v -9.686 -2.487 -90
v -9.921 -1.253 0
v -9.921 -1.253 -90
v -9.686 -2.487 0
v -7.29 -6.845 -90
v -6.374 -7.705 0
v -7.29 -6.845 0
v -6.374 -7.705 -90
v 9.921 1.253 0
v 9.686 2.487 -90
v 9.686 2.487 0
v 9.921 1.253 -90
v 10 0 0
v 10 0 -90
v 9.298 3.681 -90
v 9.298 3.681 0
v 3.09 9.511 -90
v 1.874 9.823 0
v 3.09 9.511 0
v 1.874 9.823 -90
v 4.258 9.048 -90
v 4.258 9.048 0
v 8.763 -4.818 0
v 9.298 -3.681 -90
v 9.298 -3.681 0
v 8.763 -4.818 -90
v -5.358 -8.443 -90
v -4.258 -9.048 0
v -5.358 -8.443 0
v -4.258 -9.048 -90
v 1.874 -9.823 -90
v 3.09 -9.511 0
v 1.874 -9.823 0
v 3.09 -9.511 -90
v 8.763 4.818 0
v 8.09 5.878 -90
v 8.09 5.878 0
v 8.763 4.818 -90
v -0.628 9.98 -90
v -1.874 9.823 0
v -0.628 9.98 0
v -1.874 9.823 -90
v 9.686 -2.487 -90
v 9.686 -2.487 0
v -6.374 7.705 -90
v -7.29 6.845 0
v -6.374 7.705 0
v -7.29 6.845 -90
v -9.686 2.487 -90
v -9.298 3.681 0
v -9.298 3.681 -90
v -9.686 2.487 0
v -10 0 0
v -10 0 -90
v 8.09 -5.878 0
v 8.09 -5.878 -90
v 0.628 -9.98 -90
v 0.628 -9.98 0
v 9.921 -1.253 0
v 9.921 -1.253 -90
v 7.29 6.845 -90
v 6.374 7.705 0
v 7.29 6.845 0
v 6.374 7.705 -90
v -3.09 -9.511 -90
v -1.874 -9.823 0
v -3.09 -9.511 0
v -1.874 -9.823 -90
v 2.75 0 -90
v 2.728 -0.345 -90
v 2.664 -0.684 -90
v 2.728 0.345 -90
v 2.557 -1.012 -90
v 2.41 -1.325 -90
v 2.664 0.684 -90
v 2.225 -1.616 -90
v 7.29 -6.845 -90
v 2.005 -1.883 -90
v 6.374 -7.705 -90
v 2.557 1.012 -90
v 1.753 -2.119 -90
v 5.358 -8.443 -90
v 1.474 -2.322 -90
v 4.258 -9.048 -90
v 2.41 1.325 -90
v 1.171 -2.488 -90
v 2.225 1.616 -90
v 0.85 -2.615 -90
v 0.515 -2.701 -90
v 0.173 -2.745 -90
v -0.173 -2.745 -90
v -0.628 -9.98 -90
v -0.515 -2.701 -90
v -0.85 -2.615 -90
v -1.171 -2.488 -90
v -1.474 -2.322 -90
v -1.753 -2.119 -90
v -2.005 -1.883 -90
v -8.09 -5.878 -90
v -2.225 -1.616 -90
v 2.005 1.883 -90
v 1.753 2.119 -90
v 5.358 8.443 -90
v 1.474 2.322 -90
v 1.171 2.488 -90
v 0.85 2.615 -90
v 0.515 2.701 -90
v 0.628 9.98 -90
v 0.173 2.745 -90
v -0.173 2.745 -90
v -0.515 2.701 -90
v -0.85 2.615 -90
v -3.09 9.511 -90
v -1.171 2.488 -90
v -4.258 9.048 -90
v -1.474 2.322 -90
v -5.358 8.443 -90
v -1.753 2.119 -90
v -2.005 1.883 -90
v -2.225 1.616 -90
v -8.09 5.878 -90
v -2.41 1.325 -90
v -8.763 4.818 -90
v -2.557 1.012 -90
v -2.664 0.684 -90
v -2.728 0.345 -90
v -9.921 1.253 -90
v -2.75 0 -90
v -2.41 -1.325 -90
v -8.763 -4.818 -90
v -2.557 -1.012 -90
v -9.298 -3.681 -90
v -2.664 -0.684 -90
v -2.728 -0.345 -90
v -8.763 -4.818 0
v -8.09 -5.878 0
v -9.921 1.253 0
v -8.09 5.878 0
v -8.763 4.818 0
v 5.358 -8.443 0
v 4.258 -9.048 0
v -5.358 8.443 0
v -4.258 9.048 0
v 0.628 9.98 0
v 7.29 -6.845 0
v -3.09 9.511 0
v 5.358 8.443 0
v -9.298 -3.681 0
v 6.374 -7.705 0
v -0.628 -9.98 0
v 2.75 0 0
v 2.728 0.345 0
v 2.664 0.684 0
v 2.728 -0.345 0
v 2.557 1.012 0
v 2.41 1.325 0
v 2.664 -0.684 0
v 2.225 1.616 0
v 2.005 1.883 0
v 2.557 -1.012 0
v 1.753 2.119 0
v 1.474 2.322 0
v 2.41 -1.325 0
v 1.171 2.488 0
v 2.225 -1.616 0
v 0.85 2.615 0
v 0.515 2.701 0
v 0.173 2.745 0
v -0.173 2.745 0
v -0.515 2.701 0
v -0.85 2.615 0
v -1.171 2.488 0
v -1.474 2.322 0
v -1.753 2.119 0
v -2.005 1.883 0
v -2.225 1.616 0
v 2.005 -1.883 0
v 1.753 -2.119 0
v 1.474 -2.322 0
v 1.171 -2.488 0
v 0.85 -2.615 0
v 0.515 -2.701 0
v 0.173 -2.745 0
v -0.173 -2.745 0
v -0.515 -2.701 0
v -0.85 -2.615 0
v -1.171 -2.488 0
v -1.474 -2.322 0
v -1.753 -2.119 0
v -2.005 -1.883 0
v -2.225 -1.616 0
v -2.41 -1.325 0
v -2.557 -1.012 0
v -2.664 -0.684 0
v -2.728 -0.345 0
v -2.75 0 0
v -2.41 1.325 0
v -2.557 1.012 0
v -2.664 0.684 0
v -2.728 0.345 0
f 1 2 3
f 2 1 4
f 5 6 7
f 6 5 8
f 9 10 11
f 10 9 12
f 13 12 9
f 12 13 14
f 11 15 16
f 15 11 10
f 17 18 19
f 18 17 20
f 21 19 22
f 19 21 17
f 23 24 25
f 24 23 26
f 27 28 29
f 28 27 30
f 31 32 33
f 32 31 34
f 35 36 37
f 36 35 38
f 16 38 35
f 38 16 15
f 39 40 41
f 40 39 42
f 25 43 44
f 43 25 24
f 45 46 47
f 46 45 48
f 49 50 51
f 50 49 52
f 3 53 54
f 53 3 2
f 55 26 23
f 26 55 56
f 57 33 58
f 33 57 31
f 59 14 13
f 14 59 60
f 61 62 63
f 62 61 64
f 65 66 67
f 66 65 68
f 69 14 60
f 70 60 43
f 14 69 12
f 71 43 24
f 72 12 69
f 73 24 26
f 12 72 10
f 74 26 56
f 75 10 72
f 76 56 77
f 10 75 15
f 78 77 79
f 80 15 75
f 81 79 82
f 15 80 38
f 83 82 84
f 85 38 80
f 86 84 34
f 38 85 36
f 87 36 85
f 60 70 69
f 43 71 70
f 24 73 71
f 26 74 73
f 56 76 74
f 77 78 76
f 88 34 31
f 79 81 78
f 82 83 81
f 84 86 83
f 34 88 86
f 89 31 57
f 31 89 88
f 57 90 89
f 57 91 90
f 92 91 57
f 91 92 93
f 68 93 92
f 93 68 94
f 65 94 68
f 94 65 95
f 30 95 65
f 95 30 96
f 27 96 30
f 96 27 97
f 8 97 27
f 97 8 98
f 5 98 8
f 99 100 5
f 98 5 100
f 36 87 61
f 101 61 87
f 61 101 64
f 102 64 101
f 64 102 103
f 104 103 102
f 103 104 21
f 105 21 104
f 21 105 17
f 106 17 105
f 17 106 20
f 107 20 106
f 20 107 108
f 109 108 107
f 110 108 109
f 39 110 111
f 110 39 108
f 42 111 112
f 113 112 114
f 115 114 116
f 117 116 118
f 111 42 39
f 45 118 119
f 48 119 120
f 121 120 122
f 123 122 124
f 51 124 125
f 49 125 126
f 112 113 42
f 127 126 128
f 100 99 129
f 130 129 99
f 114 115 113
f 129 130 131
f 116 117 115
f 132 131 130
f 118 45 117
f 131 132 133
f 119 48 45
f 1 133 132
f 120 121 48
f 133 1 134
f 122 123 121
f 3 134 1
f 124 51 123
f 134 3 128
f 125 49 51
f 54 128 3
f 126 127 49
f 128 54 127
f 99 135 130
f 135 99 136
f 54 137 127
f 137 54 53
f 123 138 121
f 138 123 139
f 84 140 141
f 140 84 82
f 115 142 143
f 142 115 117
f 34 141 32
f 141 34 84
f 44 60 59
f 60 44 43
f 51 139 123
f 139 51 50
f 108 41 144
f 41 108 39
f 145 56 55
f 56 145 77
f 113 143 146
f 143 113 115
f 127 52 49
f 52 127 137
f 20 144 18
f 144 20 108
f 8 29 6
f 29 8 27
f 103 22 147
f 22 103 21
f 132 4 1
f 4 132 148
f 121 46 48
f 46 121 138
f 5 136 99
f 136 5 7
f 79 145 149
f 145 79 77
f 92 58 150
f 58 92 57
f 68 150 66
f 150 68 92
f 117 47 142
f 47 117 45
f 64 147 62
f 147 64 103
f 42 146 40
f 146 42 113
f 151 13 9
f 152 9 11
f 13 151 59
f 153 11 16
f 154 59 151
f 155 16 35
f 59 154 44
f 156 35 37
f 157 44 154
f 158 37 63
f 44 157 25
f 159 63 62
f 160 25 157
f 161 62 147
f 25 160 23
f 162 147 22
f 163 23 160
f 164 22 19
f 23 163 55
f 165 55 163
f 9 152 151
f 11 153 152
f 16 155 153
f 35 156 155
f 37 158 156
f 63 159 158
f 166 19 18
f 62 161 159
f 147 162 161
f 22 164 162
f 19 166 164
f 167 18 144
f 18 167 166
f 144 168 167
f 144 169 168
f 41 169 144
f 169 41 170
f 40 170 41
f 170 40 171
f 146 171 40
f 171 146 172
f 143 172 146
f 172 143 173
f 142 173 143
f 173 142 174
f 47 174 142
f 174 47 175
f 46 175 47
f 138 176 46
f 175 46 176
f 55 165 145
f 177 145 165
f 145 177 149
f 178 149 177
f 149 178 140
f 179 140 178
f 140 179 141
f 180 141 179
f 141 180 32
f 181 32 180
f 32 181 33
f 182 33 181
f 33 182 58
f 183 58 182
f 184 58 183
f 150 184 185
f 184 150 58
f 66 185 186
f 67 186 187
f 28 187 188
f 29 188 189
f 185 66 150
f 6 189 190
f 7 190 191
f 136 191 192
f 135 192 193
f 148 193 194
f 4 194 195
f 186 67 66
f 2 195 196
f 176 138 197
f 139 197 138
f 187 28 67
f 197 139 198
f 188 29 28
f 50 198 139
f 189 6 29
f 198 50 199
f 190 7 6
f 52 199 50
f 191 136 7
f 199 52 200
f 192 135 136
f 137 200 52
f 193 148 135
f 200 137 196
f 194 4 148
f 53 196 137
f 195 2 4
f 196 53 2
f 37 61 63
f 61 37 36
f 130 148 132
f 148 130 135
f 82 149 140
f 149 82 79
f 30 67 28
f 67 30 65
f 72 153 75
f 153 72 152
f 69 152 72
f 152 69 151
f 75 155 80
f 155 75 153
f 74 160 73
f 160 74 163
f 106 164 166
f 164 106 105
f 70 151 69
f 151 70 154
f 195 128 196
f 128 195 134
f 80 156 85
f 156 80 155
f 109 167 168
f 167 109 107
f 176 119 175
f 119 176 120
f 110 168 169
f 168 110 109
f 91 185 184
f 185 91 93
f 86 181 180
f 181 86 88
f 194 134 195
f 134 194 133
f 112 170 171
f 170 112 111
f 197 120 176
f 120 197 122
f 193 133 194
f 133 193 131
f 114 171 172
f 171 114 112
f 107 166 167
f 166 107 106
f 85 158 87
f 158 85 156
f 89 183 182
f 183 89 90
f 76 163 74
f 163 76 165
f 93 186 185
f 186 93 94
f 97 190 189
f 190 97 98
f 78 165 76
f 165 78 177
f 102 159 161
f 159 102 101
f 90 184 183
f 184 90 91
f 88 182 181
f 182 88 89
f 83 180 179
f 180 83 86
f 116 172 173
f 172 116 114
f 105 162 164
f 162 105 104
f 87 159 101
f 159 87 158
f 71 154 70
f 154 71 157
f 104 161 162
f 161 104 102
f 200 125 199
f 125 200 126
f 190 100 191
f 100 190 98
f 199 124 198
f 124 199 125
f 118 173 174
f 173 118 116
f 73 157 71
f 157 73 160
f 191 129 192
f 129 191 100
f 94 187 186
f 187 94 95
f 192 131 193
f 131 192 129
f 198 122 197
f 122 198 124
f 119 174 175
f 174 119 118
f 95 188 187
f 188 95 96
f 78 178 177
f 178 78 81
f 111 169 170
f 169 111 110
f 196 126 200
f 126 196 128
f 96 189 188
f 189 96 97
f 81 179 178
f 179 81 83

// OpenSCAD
$fn = 50;


difference() {
	union() {
		translate(v = [0, 0, -90.0000000000]) {
			cylinder(h = 90, r = 10.0000000000);
		}
		cylinder(h = 0, r = 19.0000000000);
	}
	union() {
		#translate(v = [0, 0, -90]) {
			cylinder(h = 90, r = 2.7500000000);
		}
	}
}
